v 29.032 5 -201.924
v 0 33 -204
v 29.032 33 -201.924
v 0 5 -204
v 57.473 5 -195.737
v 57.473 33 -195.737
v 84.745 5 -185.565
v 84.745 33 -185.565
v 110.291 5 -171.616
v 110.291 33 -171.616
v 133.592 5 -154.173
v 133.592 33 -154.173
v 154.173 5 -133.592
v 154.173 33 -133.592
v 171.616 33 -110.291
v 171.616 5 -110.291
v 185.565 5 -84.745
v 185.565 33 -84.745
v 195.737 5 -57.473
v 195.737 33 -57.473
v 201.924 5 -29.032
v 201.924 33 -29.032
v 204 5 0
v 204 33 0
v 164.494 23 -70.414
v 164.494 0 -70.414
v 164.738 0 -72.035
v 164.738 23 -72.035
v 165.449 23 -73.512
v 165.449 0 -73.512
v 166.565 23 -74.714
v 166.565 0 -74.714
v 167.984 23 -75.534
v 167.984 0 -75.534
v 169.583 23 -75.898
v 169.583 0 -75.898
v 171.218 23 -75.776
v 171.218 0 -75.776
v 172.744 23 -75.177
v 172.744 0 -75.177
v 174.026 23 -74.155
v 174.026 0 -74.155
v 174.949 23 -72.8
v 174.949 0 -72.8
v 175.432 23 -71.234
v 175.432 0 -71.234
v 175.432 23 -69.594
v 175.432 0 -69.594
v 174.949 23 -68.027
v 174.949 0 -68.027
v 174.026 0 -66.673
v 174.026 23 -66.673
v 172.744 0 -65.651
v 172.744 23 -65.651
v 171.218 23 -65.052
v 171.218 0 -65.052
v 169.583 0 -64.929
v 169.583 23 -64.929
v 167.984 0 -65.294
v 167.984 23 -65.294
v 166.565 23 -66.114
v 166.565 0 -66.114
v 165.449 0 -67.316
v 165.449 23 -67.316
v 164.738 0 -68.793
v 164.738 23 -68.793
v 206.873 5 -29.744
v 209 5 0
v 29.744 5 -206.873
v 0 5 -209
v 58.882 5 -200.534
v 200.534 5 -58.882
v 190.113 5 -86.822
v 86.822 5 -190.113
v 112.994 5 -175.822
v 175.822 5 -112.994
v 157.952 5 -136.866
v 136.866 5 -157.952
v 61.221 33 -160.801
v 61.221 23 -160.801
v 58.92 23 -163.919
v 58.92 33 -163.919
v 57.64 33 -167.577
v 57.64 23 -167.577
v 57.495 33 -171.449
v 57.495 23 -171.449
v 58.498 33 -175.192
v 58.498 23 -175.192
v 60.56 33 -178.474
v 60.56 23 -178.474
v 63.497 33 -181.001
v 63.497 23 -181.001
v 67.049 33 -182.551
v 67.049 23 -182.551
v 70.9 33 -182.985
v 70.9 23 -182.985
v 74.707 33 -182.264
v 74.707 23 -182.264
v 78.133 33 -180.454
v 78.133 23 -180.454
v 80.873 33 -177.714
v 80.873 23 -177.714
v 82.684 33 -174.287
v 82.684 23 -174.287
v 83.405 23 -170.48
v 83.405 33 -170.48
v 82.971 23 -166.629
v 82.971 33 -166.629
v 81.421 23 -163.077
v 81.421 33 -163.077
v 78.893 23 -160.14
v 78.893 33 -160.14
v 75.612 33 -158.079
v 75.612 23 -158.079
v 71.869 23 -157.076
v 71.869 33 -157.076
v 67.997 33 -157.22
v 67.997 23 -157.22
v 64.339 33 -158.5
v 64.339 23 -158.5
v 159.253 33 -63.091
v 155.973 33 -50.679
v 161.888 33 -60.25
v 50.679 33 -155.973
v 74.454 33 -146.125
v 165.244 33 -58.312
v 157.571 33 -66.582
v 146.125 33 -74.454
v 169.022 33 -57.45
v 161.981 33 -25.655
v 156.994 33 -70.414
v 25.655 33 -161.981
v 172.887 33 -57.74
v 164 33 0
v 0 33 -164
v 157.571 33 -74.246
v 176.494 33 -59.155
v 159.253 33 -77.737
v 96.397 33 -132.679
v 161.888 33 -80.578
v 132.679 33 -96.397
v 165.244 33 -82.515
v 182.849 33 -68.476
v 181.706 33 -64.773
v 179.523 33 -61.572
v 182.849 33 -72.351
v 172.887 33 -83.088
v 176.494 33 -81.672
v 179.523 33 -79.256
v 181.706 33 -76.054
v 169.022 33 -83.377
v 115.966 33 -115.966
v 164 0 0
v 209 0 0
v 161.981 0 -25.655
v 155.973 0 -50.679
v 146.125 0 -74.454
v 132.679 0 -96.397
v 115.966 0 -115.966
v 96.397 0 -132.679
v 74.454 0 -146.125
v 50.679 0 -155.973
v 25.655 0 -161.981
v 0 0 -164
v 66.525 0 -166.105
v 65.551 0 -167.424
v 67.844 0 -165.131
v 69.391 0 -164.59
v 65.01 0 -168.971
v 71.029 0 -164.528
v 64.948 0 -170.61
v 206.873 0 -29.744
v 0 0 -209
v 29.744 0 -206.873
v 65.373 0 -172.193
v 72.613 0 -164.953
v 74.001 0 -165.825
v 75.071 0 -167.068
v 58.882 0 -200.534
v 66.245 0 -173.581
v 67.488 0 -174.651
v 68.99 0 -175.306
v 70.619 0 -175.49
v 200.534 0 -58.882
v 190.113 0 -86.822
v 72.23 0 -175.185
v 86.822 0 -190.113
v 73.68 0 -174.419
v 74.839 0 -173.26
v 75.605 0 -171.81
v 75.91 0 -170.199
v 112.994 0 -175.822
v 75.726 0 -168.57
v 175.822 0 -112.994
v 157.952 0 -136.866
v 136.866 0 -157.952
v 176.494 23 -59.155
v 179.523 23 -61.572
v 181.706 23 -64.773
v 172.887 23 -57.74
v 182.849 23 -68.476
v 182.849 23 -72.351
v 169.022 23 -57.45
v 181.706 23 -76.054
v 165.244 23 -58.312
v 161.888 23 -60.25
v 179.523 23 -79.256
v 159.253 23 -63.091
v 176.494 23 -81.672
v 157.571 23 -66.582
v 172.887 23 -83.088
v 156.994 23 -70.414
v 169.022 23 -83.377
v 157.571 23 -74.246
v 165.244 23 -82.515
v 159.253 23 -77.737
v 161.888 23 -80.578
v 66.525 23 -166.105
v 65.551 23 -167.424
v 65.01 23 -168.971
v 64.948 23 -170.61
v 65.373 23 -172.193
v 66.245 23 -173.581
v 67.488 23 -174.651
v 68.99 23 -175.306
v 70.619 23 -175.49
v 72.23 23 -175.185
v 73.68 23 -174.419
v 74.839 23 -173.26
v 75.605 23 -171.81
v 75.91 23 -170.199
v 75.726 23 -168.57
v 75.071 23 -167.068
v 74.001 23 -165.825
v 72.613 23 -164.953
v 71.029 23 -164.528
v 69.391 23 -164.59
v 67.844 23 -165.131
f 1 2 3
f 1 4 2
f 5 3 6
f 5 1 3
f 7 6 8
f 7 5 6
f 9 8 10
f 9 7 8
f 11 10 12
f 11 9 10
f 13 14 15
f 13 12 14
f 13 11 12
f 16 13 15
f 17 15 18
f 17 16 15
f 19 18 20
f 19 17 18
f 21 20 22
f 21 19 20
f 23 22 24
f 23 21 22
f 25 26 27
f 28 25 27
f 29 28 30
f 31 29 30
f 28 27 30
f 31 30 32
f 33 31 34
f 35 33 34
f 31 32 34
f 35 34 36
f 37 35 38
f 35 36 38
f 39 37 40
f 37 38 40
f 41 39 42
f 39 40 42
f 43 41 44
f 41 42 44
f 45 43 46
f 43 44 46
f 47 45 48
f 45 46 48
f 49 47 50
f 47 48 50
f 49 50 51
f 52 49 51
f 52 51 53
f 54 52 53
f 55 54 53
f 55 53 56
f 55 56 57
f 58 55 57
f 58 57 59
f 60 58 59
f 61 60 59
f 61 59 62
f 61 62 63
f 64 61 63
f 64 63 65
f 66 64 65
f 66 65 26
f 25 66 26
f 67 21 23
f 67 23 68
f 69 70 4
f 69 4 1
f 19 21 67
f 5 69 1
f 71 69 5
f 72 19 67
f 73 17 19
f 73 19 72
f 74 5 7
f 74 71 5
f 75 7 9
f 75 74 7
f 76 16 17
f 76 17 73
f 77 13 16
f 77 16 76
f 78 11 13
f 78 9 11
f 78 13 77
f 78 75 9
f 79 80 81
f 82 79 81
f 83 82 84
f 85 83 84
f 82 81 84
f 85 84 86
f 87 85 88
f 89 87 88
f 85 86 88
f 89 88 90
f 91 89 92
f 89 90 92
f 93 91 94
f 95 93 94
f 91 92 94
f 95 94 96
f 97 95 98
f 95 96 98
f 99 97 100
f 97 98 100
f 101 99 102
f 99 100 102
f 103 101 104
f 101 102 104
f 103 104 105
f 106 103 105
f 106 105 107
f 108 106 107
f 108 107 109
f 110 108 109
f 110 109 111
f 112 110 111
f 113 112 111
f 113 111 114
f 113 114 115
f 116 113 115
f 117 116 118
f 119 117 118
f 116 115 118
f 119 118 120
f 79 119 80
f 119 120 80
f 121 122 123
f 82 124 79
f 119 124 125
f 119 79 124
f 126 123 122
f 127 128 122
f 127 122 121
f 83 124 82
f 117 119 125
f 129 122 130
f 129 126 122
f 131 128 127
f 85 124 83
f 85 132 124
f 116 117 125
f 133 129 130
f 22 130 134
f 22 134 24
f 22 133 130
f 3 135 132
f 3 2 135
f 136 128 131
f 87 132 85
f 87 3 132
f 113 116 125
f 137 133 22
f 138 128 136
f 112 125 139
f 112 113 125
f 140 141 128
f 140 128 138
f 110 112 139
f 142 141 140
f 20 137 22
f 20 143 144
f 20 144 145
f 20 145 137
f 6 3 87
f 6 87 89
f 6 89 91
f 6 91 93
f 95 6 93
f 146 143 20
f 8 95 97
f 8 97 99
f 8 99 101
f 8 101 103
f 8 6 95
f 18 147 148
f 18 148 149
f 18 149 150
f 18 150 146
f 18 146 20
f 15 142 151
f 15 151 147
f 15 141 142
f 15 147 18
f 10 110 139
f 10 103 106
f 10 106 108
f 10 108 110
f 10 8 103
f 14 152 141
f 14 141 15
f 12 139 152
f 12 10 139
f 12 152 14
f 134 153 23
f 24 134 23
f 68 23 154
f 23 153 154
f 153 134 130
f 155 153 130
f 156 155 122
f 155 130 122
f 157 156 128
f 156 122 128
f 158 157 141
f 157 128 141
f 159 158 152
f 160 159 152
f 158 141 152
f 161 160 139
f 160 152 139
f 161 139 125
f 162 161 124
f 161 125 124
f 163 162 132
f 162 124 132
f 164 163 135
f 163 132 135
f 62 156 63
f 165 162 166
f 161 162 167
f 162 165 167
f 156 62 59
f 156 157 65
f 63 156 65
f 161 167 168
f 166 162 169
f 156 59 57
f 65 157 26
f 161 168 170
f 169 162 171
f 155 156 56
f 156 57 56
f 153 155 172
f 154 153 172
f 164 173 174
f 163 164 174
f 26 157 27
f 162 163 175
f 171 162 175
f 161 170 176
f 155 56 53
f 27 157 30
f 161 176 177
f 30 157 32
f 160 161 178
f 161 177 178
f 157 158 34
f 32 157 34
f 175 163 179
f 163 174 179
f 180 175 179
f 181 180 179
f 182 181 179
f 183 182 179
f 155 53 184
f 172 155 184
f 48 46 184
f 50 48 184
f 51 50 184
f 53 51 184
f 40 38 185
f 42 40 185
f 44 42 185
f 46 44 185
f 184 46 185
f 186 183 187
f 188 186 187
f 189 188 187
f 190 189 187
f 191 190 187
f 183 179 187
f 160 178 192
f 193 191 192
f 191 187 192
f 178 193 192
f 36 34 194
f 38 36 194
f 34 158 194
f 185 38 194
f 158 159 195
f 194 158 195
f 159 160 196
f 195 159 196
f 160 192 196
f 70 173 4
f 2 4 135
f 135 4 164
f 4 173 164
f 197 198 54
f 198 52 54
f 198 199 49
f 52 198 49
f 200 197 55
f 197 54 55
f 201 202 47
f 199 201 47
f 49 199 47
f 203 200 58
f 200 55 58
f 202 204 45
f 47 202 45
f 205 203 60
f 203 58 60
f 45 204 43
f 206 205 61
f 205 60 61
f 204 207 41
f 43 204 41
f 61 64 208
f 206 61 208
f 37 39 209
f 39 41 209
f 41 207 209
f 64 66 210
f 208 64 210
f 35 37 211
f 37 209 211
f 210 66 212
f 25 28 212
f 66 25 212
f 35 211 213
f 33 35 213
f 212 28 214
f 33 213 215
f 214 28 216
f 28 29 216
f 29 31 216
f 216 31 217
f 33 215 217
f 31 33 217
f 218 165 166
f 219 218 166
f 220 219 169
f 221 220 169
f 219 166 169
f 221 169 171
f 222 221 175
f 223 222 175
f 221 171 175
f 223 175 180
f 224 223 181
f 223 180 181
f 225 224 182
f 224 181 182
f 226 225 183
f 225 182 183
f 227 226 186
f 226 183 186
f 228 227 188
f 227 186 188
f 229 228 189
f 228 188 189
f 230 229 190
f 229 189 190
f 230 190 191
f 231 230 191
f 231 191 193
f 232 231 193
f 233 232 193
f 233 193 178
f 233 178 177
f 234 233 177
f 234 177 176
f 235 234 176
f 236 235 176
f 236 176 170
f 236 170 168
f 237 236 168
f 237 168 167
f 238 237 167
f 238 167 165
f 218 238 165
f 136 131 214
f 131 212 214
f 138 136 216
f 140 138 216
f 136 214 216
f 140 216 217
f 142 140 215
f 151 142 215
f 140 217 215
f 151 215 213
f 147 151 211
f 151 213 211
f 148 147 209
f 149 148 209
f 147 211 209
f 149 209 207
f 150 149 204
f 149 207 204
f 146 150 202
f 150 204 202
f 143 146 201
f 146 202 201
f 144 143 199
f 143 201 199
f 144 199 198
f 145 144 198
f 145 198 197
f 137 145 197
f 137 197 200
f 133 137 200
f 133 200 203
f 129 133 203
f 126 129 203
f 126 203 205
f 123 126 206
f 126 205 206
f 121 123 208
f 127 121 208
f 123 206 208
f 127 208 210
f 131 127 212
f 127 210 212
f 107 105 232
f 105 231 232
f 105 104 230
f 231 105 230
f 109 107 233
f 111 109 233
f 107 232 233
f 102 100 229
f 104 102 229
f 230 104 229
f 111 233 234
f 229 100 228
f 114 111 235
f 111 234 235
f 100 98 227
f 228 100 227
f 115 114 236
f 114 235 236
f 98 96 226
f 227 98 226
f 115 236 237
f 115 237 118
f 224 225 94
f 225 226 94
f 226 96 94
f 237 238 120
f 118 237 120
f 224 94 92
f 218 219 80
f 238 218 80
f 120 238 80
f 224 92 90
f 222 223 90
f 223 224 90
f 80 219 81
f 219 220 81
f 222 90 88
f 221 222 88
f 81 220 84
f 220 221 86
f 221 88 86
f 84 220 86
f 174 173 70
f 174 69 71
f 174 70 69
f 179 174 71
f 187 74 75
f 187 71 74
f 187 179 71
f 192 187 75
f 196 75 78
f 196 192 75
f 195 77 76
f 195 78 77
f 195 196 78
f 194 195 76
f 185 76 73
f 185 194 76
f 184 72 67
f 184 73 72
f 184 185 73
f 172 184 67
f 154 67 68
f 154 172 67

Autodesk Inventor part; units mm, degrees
ref_plane "YZ Plane" through (0, 0, 0) normal (1, 0, 0) x (0, 1, 0)
ref_plane "XZ Plane" through (0, 0, 0) normal (0, 1, 0) x (-1, 0, 0)
ref_plane "XY Plane" through (0, 0, 0) normal (0, 0, 1) x (1, 0, 0)
sketch "Sketch5" plane through (0, 0, 0) normal (0, 0, 1) x (1, 0, 0)
  line L0 (0, 0) -> (0, 33)
  line L1 (164, 0) -> (164, 33)
  line L2 (164, 33) -> (204, 33)
  line L3 (204, 33) -> (204, 5)
  line L4 (204, 5) -> (209, 5)
  line L5 (209, 5) -> (209, 0)
  line L6 (209, 0) -> (164, 0)
  point P0 (186.5, 0)
  dimension "d16" = 328
  dimension "d17" = 408
  dimension "d19" = 28
  dimension "d20" = 5
  dimension "d21" = 5
revolve "Revolution1" add sketch "Sketch5" angle 360 about axis through (0, 0, 0) along (0, 1, 0)
sketch "Sketch6" plane through (0, 33, 0) normal (0, 1, 0) x (1, 0, 0)
  circle A0 centre (0, 0) radius 184
  line L0 (0, 0) -> (-70.4138, 169.9938)
  line L1 (0, 0) -> (0, 184)
  dimension "d23" = 368
  dimension "d34" = 22.5
hole "Hole1" at (-70.4138, 33, -169.9938) direction (0, -1, 0) diameter 11 end through all counterbore diameter 26 counterbore depth 10
pattern_circular "Circular Pattern2" count 8 over 360 about axis through (0, -10, 0) along (0, 1, 0) of "Hole1"
sketch "Sketch7" plane through (0, 0, 0) normal (0, 1, 0) x (-1, 0, 0)
  circle A0 centre (0, 0) radius 209 projected
  line L0 (0, -209) -> (0, 0)
  line L1 (0, 0) -> (-209, 0)
  circle A1 centre (0, 0) radius 209 projected
extrude "Extrusion5" cut sketch "Sketch7" along normal through all both and the other way through all contours A0 L0 L1 picked at (-105.1818, 91.1406)
equation "\"d29\" = Thickness"
equation "\"Thickness\" = 40"
properties part number "DMF 0132 Барабан Опорное кольцо КОРМА четверть"
